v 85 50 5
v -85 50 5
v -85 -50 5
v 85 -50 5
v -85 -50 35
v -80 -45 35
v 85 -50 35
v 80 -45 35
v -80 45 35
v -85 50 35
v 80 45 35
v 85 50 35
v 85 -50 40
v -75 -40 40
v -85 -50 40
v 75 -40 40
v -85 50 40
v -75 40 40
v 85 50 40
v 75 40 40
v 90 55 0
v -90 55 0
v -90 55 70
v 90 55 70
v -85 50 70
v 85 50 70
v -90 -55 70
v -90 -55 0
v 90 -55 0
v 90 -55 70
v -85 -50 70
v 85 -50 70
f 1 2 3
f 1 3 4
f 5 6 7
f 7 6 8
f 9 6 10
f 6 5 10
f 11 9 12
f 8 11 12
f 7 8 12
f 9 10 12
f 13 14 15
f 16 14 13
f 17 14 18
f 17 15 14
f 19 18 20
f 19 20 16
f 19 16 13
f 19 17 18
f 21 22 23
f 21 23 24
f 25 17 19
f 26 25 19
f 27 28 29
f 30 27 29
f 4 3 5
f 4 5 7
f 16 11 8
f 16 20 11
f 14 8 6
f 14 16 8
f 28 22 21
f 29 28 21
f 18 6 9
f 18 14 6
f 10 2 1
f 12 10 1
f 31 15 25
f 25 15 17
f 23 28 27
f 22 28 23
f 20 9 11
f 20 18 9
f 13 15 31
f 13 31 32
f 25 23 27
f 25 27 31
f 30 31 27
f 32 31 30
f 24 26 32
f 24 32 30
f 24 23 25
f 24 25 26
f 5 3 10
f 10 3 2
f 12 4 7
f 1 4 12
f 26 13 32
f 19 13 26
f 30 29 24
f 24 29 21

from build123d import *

# Parameters (mm, degrees)
F1_W     = 180
F1_H     = 110
F1_W_2   = 170
F1_H_2   = 100
F2_DEPTH = 70
F0_W     = 180
F0_H     = 110
F3_DEPTH = 5
F5_W     = 170
F5_H     = 100
F5_W_2   = 160
F5_H_2   = 90
F6_DEPTH = 5
F6_TAPER = -45


with BuildPart() as f2:
    # F1 (on face) → F2 (new body)
    with BuildSketch(Plane.XY):
        Rectangle(F1_W, F1_H)
        Rectangle(F1_W_2, F1_H_2, mode=Mode.SUBTRACT)
    extrude(amount=F2_DEPTH)

    # F0 (on Top) → F3 (join)
    with BuildSketch(Plane.XY):
        Rectangle(F0_W, F0_H)
    extrude(amount=F3_DEPTH)

    # F5 (on offset) → F6 (join)
    with BuildSketch(Plane.XY.offset(35)):
        Rectangle(F5_W, F5_H)
        Rectangle(F5_W_2, F5_H_2, mode=Mode.SUBTRACT)
    extrude(amount=F6_DEPTH, taper=F6_TAPER)


solid = f2.part
